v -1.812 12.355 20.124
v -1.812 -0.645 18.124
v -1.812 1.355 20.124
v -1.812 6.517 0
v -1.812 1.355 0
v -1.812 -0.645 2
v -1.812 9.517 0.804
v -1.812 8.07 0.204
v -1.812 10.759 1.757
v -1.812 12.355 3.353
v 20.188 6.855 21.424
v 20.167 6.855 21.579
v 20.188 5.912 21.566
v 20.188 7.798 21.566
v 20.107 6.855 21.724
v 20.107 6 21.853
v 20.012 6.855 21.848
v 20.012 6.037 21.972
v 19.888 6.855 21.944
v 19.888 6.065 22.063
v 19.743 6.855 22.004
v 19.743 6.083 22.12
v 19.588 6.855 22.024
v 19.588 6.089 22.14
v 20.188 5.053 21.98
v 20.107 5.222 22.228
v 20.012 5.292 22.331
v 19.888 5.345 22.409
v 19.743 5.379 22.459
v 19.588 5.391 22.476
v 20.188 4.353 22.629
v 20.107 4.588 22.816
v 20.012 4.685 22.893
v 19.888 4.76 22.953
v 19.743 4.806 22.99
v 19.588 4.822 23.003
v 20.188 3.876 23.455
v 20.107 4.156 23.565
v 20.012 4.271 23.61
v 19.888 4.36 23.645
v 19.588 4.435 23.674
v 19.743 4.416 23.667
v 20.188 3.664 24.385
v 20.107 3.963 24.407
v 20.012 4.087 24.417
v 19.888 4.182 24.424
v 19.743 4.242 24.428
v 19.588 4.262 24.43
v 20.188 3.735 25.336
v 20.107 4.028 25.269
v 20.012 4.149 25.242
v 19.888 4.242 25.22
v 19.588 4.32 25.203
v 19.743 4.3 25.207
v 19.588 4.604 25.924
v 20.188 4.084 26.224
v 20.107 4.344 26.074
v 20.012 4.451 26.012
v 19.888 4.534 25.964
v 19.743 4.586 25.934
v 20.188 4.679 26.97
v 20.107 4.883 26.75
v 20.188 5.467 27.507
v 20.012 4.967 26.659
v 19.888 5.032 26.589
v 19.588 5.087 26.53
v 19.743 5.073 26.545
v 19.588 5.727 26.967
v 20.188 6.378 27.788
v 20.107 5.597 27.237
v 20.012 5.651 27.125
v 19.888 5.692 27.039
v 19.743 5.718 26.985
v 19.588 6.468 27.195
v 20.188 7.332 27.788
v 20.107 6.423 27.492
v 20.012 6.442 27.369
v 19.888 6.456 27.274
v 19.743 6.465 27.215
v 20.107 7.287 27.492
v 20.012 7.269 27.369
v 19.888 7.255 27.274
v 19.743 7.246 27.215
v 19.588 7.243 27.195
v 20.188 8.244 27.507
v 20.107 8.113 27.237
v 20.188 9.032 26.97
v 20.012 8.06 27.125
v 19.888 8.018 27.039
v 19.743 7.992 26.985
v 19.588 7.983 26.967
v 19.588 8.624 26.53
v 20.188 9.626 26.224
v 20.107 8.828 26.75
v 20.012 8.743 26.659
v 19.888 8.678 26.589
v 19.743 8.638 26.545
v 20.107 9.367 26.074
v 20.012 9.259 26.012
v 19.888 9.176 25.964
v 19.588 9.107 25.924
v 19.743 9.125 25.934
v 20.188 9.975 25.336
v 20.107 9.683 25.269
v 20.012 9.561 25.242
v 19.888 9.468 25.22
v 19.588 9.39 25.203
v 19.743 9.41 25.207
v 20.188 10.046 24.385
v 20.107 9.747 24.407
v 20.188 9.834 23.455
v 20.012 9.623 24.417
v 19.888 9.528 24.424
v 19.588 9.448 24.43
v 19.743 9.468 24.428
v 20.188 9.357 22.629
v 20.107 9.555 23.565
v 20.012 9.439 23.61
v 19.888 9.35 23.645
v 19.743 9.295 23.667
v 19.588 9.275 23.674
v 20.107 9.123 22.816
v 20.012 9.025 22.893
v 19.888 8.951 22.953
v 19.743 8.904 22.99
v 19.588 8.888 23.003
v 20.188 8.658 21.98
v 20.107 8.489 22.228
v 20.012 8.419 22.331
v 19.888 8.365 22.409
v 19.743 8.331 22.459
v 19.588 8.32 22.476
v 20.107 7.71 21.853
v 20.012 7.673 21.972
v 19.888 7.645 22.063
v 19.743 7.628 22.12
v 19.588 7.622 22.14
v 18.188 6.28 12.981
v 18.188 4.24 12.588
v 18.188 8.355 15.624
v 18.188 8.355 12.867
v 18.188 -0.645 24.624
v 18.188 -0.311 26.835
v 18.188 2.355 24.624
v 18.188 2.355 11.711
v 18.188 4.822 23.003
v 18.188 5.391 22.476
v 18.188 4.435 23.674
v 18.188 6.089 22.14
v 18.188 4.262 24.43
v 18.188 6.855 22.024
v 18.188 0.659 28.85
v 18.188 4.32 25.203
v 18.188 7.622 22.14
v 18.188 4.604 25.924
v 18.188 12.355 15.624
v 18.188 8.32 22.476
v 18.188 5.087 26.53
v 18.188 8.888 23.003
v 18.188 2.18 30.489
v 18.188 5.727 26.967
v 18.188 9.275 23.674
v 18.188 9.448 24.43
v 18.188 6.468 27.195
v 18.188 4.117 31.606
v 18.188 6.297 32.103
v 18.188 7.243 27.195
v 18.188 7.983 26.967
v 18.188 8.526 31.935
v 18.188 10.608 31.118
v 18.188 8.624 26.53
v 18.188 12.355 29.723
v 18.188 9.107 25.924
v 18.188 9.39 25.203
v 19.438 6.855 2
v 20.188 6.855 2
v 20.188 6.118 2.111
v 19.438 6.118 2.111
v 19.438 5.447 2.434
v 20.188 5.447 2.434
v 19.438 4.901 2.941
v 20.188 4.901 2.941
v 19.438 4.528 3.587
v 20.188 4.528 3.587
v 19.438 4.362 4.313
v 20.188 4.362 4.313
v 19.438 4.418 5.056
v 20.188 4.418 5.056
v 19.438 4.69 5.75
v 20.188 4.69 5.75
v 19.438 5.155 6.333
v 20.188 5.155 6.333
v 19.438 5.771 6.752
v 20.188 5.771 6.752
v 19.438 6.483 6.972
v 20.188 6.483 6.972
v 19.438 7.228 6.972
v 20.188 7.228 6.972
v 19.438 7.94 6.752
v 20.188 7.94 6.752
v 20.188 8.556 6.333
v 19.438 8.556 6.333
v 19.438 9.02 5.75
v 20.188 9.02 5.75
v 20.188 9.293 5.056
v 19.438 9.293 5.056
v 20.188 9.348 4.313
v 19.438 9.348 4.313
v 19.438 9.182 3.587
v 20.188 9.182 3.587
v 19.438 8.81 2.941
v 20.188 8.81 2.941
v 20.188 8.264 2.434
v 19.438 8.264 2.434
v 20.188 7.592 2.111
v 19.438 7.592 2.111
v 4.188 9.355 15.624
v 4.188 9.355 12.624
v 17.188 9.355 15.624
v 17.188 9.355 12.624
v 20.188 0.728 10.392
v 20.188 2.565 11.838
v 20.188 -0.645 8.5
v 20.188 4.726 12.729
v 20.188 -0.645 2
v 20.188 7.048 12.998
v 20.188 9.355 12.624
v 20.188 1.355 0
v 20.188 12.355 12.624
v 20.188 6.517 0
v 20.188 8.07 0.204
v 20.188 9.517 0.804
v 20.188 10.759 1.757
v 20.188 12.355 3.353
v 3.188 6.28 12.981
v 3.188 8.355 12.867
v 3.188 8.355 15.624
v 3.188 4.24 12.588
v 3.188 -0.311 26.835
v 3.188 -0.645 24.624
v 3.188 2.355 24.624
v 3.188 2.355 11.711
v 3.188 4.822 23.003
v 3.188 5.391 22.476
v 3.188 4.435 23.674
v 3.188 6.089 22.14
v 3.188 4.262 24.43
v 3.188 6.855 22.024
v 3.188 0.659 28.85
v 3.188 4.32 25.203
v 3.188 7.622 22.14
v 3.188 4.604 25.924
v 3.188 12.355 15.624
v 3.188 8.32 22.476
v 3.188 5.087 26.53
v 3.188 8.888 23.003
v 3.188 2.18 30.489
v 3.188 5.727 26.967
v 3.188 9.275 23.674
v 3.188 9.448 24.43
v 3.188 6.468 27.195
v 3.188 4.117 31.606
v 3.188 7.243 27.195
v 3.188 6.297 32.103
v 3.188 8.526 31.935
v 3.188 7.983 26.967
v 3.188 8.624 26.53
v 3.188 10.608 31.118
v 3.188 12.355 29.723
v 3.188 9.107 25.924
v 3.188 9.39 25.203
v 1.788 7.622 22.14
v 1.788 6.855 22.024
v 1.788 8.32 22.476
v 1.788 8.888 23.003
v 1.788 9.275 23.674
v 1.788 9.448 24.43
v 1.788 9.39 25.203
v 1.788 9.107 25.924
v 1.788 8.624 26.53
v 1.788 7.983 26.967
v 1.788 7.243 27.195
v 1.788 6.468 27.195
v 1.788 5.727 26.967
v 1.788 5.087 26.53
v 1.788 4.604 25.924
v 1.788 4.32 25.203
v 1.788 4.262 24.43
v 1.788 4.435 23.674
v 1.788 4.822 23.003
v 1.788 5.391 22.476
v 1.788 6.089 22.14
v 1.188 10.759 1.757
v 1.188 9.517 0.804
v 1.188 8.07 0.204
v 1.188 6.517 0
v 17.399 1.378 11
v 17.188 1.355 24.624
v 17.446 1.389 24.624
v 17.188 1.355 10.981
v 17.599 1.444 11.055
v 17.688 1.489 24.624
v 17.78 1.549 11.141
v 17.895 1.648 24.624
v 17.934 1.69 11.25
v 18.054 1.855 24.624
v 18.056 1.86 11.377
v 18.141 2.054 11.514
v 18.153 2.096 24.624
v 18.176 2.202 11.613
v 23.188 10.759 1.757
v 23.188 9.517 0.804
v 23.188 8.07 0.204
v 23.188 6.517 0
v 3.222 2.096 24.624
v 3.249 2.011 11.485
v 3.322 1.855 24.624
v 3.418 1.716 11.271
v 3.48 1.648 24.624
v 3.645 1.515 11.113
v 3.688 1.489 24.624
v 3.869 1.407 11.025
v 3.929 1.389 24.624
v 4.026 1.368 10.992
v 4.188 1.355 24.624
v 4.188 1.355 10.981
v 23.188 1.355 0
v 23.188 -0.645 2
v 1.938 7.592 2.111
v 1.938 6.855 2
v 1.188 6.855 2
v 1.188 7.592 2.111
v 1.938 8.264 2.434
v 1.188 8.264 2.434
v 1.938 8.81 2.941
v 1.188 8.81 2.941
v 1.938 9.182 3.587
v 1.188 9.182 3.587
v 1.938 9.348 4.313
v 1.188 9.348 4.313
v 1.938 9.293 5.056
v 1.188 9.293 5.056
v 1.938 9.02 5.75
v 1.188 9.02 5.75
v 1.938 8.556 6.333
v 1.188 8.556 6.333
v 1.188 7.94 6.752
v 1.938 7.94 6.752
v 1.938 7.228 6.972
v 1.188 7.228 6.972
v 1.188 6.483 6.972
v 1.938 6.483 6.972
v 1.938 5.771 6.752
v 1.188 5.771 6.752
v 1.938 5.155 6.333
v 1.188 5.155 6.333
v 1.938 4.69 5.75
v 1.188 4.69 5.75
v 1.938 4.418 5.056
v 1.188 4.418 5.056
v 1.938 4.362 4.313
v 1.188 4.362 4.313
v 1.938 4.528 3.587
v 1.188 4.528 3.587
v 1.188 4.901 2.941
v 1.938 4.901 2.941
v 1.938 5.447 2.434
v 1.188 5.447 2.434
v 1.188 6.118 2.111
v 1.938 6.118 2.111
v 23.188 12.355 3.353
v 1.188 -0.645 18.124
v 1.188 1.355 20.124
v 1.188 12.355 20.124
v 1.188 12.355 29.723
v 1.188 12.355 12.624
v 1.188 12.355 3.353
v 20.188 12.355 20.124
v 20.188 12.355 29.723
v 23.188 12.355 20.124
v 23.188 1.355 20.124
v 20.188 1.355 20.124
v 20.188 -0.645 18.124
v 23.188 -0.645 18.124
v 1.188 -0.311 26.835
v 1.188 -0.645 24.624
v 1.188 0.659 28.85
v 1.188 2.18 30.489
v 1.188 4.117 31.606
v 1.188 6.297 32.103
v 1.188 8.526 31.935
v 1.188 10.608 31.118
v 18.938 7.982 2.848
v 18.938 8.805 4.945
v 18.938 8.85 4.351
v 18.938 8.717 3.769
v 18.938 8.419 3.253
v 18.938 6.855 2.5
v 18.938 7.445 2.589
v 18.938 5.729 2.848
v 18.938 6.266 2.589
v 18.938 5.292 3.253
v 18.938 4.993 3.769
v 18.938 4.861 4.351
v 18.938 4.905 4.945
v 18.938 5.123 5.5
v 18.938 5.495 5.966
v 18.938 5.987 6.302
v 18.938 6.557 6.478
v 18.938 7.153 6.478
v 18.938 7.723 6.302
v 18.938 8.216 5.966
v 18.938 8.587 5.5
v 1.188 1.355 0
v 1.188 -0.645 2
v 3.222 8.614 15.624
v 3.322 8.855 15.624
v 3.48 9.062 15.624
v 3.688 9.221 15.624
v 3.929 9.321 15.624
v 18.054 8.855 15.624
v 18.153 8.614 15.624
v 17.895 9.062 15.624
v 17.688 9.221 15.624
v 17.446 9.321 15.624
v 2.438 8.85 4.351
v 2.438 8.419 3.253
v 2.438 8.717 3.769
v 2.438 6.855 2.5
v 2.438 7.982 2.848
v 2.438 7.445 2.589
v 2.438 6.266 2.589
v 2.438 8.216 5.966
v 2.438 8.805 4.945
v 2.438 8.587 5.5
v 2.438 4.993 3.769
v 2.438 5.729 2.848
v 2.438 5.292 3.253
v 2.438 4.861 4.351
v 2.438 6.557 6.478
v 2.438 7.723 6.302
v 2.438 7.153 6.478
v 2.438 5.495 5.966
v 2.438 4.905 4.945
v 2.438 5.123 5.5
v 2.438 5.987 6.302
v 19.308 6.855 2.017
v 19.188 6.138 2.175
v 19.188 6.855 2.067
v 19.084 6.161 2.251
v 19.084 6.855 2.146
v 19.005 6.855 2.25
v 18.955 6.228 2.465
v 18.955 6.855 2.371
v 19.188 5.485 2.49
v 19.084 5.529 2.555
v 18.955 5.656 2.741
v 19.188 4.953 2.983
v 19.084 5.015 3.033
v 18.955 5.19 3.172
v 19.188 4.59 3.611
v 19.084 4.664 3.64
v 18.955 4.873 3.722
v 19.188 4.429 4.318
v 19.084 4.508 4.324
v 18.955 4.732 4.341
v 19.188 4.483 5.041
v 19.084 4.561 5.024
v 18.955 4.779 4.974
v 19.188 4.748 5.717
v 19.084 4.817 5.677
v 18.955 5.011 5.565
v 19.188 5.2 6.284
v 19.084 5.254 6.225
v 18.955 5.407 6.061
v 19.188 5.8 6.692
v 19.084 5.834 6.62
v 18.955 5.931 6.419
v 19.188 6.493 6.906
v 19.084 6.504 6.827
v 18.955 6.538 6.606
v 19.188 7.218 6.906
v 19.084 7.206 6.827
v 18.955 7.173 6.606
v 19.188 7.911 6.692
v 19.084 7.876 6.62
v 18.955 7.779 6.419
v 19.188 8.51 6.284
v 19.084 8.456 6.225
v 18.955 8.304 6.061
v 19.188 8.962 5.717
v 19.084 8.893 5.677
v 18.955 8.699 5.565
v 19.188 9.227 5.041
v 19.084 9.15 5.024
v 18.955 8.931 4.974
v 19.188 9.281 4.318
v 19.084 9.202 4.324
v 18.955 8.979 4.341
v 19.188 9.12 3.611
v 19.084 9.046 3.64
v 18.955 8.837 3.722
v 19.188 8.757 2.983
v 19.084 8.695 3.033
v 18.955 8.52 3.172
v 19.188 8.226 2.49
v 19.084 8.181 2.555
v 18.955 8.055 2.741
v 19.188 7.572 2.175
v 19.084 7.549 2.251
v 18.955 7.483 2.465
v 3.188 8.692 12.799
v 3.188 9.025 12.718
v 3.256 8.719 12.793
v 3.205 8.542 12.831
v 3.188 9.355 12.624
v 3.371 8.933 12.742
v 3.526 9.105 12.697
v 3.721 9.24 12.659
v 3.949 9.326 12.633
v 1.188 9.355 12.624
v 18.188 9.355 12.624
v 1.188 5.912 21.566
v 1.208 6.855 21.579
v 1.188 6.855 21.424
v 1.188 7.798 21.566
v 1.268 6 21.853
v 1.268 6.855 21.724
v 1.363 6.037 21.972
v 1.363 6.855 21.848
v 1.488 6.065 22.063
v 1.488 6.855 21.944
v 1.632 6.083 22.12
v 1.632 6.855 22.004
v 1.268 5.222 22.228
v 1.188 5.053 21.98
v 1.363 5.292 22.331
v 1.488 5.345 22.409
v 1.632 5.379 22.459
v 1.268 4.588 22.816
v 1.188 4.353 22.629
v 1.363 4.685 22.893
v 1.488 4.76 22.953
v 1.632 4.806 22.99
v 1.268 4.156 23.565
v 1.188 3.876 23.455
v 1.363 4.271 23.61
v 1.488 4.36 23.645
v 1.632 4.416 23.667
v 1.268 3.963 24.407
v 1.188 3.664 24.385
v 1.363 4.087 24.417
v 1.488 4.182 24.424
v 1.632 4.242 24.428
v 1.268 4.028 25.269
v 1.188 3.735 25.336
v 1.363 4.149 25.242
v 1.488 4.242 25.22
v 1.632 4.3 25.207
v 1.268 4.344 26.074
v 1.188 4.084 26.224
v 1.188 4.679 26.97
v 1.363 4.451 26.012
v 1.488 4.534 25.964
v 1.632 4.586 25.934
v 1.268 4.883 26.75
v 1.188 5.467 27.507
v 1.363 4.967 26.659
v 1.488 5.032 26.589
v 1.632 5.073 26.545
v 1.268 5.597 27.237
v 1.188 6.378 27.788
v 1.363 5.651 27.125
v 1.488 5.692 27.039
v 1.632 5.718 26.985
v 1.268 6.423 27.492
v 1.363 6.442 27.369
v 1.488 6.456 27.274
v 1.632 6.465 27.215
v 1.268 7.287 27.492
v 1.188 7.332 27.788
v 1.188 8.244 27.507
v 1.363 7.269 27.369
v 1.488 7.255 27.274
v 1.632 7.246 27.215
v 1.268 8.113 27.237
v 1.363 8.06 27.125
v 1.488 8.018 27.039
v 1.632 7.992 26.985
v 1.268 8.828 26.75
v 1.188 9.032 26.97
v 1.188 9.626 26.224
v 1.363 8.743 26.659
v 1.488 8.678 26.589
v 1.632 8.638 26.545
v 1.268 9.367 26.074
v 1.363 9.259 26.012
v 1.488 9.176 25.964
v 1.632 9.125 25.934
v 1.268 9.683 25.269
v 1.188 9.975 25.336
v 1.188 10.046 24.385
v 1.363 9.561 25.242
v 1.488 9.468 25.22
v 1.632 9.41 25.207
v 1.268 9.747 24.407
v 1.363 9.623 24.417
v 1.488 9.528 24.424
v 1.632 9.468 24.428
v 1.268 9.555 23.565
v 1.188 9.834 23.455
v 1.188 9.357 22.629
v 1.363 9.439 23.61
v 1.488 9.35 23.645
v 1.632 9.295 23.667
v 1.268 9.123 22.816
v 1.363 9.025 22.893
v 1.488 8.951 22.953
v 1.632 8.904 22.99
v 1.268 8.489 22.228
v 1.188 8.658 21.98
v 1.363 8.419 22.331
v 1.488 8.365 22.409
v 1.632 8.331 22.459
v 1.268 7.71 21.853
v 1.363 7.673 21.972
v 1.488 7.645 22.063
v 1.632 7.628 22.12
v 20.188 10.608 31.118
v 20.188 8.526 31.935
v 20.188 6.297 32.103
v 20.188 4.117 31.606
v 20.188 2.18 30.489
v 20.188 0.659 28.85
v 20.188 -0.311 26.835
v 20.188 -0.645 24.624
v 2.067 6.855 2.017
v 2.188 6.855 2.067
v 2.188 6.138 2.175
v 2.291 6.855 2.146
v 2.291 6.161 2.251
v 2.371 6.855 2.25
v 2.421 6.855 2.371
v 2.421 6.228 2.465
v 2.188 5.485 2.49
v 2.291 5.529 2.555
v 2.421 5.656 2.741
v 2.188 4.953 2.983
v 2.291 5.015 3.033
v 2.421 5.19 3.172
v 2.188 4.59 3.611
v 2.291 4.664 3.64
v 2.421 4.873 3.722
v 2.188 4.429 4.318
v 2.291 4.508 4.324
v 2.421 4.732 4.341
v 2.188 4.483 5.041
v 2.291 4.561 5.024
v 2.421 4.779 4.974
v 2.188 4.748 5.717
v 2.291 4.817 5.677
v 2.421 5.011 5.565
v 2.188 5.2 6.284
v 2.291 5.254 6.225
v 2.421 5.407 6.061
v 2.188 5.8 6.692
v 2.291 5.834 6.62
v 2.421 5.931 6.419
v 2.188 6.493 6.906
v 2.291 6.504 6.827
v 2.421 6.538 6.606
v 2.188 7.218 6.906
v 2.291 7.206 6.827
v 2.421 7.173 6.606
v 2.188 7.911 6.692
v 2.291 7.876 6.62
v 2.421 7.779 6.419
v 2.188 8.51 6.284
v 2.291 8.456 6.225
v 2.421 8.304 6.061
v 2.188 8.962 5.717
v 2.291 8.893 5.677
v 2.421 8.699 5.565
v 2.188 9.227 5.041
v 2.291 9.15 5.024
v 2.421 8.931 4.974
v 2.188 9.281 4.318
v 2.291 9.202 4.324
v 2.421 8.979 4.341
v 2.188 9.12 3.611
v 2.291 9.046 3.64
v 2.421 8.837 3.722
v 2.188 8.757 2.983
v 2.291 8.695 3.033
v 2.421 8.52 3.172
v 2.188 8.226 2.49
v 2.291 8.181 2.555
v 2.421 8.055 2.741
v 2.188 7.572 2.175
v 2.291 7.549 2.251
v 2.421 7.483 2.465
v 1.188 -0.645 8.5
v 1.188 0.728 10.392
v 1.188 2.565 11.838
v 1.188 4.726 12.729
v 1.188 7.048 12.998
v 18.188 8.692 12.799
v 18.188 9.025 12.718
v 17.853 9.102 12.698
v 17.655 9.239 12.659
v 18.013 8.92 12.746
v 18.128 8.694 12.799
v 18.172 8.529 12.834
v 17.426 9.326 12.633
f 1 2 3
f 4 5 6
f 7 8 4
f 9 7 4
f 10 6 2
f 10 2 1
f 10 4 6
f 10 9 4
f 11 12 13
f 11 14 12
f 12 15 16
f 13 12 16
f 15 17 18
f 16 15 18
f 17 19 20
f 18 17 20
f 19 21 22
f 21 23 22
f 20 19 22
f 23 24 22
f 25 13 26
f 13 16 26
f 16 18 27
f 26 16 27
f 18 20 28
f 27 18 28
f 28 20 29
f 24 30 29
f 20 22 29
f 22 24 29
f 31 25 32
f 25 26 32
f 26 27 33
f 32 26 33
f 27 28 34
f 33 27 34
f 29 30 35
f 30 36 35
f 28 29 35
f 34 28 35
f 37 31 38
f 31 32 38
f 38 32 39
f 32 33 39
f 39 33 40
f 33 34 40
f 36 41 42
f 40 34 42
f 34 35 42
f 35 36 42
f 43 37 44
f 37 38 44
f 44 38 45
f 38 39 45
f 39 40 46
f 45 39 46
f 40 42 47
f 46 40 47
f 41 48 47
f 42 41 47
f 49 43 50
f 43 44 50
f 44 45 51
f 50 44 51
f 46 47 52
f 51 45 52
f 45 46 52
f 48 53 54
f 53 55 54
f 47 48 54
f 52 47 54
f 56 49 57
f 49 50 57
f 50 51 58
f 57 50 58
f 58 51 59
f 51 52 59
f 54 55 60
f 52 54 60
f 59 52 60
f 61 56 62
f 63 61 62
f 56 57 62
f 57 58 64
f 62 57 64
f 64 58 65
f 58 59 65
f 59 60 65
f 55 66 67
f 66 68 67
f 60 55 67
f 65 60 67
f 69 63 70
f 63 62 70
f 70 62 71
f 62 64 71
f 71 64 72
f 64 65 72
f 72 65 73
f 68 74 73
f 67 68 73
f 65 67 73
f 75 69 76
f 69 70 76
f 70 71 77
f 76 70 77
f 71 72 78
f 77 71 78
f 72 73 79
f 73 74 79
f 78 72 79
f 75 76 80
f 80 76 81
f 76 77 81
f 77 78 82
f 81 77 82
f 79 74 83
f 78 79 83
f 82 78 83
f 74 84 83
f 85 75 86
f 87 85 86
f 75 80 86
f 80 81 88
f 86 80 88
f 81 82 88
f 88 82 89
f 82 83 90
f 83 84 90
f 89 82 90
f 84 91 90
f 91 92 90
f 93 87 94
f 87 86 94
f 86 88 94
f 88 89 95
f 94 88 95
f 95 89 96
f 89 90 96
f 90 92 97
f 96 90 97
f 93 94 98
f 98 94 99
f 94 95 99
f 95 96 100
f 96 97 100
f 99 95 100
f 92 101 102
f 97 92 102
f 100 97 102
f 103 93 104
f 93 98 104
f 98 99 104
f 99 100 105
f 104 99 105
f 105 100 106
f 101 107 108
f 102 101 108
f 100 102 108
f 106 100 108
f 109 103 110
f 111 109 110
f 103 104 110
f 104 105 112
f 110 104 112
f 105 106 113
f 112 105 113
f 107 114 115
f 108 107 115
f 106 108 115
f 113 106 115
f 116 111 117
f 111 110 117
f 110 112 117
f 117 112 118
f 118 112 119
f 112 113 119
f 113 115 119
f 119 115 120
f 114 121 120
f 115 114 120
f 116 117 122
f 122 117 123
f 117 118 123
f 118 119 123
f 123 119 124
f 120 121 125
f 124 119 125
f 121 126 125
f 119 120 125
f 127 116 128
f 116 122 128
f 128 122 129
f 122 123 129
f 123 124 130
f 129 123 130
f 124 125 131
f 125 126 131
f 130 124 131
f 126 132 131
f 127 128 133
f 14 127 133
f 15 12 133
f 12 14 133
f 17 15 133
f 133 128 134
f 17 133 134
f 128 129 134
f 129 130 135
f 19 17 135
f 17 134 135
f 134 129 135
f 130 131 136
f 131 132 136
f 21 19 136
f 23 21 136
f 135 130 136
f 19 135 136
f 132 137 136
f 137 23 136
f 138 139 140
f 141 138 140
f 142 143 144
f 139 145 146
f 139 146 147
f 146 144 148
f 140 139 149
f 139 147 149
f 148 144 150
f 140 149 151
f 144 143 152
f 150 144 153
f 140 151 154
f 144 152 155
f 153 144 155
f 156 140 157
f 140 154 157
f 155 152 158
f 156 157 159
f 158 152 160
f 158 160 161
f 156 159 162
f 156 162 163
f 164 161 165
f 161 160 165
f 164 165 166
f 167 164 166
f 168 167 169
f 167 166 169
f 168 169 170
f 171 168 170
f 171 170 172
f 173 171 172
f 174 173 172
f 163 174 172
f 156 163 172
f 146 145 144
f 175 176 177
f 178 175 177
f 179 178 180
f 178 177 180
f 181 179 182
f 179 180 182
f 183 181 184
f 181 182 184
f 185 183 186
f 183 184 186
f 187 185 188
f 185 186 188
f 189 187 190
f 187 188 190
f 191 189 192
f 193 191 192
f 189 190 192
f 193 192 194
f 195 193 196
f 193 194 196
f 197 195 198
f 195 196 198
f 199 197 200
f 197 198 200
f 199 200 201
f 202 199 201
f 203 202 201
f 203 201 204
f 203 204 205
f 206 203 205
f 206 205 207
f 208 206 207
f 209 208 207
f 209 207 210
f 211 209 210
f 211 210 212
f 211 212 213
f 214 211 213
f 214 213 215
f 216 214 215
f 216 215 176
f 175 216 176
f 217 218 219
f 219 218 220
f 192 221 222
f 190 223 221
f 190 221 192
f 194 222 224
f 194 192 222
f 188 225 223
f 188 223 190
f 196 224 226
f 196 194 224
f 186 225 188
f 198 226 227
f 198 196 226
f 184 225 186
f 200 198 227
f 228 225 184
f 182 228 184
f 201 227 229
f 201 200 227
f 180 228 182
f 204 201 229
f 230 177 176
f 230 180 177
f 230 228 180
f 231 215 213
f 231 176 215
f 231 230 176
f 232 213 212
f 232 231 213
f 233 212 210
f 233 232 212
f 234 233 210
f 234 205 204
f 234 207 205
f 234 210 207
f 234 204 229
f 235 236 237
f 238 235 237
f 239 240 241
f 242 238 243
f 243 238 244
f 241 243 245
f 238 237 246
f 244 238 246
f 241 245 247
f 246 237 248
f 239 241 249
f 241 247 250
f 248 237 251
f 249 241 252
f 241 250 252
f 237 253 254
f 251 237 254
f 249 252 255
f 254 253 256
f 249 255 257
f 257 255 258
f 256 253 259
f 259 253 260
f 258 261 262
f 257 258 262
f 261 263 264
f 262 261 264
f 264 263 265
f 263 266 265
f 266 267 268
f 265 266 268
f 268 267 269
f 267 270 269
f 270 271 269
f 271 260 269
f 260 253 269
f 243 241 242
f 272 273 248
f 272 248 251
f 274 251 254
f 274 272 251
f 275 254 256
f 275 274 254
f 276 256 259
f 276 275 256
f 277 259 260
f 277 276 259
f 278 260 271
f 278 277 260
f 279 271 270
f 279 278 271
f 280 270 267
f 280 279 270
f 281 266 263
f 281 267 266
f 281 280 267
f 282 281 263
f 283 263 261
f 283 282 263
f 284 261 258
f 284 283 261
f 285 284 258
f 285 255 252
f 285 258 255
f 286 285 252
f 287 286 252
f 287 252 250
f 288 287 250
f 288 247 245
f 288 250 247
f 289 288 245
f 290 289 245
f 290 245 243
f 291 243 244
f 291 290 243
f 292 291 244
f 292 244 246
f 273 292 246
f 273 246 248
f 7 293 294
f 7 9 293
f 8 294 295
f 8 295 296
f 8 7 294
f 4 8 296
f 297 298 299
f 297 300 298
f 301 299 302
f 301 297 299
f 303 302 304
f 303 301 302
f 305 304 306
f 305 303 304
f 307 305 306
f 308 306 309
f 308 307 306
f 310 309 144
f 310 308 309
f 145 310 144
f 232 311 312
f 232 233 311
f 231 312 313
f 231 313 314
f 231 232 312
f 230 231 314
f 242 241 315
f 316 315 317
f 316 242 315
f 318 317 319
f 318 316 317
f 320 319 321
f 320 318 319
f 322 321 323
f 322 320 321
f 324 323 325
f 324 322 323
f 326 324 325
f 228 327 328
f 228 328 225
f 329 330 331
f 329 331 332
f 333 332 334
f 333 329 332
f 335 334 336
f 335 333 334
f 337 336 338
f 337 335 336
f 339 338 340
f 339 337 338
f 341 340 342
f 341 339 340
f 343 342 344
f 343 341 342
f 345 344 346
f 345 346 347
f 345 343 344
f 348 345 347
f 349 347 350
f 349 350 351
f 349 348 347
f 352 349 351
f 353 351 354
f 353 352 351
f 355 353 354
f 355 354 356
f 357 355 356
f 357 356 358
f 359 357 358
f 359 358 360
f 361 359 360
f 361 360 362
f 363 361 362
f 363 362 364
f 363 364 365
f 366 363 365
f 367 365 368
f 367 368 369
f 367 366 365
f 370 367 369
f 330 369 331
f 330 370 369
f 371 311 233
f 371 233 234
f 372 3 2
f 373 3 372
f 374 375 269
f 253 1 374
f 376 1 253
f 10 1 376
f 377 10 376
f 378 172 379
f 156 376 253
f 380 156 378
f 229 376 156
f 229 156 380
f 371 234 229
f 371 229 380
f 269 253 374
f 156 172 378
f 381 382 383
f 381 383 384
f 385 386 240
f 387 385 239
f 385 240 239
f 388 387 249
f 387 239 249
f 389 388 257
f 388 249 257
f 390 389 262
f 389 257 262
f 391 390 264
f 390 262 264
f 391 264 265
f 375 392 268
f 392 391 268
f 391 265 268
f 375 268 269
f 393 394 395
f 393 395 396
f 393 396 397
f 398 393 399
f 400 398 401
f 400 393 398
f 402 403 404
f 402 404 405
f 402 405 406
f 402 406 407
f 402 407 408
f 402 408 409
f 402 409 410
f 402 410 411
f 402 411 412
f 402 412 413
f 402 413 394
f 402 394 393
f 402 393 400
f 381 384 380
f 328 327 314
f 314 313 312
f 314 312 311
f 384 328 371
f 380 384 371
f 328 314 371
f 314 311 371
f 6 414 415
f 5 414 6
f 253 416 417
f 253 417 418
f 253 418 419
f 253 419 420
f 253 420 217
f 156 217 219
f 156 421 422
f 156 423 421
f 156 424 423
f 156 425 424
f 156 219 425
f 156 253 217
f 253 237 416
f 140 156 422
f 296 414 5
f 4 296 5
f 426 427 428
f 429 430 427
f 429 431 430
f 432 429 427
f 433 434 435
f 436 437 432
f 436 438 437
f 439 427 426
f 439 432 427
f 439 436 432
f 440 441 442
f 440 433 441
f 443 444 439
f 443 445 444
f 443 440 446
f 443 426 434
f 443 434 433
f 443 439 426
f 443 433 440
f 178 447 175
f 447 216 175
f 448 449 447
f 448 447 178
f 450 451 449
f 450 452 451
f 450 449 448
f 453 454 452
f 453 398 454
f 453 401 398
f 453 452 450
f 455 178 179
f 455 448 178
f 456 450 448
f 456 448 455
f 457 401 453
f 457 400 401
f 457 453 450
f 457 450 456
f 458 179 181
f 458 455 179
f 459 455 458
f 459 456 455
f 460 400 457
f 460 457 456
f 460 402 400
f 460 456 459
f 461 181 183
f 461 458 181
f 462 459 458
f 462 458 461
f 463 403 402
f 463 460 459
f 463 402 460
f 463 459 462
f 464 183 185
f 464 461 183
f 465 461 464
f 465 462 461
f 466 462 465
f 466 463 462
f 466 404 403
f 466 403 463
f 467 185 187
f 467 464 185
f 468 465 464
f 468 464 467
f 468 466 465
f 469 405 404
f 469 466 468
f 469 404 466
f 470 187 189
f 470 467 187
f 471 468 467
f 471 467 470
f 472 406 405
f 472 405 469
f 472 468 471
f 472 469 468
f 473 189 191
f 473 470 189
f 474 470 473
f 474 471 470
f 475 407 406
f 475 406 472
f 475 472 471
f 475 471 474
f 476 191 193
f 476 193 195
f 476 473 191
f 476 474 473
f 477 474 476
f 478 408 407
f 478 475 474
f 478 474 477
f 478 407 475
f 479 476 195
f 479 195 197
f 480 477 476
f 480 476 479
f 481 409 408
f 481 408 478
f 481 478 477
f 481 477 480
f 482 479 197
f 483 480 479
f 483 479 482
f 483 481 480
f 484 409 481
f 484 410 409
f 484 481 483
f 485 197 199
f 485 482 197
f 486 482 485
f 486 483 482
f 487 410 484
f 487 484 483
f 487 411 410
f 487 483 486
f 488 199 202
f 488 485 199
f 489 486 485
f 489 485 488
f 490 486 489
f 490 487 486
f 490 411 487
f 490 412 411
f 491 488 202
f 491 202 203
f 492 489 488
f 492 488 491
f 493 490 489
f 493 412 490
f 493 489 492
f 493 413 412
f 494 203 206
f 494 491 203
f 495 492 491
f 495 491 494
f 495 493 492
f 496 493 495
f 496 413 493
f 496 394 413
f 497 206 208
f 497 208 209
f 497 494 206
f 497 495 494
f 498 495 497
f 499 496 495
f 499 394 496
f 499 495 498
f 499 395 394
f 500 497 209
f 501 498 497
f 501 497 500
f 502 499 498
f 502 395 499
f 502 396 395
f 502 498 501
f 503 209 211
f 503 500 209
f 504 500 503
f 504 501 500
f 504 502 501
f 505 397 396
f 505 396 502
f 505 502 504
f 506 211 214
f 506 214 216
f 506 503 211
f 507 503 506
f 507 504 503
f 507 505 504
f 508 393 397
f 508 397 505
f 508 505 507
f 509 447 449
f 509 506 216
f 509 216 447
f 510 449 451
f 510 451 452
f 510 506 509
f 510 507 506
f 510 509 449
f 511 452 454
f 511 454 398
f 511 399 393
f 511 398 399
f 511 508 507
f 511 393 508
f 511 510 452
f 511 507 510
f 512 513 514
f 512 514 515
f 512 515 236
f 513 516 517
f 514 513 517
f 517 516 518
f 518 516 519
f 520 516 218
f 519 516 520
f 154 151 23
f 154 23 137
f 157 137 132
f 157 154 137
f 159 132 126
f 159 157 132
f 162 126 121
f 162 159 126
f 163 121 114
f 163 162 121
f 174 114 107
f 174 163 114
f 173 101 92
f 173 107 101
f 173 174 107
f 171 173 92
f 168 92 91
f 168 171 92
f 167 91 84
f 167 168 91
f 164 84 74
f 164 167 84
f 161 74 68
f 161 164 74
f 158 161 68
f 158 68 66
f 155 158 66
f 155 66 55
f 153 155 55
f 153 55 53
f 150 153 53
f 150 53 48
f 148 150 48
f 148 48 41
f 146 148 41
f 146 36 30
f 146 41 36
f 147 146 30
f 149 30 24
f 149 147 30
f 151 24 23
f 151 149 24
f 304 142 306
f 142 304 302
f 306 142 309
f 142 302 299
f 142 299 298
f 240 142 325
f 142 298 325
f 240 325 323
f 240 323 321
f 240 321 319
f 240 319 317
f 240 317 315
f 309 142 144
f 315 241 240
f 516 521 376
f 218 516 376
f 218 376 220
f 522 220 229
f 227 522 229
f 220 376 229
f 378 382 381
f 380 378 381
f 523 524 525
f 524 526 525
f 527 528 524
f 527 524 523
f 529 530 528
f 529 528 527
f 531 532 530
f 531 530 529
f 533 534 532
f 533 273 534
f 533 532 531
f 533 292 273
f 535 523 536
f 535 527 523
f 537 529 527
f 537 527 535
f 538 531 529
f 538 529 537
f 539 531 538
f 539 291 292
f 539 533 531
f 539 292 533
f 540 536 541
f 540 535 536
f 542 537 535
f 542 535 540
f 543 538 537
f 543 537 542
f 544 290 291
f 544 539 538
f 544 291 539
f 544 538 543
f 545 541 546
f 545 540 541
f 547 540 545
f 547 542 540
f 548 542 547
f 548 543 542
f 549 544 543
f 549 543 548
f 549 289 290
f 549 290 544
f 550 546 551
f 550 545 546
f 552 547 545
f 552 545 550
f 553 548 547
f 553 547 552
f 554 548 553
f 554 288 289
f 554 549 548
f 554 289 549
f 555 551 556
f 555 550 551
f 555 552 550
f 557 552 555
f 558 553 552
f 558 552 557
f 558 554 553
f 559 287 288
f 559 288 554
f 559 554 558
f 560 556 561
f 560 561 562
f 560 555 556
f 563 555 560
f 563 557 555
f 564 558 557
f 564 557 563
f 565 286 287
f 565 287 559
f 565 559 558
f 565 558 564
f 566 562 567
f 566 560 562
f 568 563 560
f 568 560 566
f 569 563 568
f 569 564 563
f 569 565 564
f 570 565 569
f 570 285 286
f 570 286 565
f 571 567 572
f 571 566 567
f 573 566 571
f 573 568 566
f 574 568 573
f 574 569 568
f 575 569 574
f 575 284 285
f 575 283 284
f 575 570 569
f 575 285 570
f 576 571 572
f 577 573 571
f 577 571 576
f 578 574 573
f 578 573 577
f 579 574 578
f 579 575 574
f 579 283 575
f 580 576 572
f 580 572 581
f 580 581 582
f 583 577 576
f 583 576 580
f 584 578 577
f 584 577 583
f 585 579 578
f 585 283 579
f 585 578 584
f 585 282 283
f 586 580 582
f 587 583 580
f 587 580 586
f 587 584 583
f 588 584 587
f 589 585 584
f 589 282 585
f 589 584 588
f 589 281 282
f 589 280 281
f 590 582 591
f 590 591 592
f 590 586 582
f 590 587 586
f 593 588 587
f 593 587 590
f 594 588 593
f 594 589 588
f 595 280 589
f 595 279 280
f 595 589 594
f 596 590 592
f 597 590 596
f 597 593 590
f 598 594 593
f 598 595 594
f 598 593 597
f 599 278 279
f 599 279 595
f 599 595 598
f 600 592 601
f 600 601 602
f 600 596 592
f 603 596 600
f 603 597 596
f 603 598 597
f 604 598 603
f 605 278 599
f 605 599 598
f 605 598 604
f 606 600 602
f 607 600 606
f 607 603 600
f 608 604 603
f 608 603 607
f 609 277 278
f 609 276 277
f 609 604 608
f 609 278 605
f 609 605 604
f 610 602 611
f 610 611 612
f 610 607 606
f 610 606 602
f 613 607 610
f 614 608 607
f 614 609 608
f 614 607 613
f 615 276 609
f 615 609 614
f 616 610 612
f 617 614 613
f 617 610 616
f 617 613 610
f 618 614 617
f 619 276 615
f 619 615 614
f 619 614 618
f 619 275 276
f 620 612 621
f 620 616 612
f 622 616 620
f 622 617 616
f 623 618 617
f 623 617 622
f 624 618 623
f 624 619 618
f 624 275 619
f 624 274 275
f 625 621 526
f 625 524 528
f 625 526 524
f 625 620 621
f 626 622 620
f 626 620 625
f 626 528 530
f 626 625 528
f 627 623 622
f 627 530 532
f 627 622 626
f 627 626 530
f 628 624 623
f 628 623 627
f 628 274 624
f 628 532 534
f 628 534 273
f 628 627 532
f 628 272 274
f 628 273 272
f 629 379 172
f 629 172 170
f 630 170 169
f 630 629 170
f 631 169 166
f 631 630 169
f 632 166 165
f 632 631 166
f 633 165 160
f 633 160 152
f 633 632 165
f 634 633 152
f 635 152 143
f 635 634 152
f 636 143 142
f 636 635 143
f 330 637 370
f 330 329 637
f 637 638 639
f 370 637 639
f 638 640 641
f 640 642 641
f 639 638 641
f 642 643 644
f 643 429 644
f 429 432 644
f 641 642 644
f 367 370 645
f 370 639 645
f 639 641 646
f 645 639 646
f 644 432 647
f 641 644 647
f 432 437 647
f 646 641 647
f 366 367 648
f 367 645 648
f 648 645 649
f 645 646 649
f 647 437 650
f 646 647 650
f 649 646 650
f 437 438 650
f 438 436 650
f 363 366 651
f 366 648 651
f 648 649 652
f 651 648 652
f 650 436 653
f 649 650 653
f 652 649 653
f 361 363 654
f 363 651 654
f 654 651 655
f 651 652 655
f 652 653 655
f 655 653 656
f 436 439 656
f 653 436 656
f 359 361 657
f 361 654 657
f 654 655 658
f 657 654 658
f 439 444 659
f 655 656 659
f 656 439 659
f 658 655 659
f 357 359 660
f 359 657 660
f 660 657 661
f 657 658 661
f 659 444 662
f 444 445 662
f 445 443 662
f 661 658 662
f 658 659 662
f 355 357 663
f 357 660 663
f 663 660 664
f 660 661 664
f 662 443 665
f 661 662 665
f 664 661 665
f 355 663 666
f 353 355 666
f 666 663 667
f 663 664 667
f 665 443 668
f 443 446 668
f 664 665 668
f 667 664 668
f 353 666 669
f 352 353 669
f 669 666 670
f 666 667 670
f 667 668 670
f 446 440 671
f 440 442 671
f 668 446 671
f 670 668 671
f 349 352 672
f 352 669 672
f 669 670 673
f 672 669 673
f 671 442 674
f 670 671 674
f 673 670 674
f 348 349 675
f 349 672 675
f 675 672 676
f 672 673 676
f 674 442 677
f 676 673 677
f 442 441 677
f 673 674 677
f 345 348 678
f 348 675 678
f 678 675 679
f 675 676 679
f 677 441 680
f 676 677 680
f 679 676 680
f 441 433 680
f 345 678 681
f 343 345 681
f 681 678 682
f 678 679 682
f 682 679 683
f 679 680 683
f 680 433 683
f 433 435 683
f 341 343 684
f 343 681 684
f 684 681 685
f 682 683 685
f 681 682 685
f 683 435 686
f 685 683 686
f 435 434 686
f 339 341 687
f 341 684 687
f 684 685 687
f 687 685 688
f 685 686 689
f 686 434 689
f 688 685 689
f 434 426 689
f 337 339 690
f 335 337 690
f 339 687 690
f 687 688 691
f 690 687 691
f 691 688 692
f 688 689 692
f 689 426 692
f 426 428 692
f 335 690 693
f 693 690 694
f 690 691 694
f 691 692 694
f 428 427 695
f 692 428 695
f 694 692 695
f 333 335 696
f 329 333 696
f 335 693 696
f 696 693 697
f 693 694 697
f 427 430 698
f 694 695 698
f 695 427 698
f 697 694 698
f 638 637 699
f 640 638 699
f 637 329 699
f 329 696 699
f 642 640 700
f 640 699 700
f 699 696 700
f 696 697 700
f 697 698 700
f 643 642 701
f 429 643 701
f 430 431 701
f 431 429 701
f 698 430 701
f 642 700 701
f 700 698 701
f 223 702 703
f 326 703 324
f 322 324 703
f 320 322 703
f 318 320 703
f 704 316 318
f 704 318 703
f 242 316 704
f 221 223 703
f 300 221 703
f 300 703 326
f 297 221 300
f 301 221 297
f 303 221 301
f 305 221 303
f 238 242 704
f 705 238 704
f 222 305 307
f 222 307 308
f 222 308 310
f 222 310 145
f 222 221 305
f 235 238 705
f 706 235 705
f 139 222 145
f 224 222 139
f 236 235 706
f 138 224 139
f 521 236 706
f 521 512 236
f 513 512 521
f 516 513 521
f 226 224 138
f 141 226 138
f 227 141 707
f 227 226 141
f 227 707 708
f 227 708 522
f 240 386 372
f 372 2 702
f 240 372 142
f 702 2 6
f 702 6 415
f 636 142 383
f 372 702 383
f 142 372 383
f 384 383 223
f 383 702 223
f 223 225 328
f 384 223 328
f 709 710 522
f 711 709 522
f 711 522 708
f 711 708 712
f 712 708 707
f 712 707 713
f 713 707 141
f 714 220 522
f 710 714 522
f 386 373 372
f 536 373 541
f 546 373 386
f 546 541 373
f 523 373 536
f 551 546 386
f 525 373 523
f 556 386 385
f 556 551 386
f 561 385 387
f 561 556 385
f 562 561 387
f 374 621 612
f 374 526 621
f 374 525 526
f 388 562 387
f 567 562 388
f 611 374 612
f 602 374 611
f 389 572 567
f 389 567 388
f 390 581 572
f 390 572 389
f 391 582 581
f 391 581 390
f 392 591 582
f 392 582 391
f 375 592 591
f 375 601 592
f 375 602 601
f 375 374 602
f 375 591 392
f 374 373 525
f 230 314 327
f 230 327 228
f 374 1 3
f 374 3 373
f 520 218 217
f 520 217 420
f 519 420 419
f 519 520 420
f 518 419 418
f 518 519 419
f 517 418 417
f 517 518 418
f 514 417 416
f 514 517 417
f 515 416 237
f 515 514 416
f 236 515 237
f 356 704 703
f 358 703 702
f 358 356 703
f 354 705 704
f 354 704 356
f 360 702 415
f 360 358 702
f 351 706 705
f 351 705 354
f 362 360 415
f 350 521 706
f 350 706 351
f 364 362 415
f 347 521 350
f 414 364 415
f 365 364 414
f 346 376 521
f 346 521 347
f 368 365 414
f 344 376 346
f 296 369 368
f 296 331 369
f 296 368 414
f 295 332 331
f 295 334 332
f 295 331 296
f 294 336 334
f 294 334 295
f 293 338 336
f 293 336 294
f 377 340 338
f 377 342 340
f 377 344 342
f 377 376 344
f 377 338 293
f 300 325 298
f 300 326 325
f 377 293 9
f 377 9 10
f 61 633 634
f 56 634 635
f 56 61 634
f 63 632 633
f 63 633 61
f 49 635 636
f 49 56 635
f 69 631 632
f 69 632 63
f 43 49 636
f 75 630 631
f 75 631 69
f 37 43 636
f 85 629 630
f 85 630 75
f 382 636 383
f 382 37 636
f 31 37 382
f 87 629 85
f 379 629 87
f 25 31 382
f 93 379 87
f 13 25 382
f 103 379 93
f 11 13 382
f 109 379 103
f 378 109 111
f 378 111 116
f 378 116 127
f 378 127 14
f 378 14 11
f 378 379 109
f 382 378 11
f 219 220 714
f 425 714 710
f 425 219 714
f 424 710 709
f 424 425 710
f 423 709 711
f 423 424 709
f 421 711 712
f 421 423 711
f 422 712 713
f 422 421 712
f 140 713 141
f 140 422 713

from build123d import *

# Parameters (mm, degrees)
EXTRUDE_1_DEPTH           = 27
CUT_EXTRUDE_1_DEPTH       = 27
SKETCH_3_R                = 2.5000000000000013
EXTRUDE_2_DEPTH           = 2
CUT_EXTRUDE_START         = -2
SKETCH_4_R                = 8.5
SKETCH_4_R_2              = 2.5000000000000018
CUT_EXTRUDE_2_DEPTH       = 2
SKETCH_5_R                = 8.5
CUT_EXTRUDE_3_DEPTH       = 17
SKETCH_9_W                = 19
SKETCH_9_H                = 0.7371254741666728
CUT_EXTRUDE_7_DEPTH       = 4
CUT_EXTRUDE_8_DEPTH       = 0.906172
EXTRUDE_START             = 2
SKETCH_13_R               = 2.5000000000000004
EXTRUDE_4_DEPTH           = 2
SKETCH_14_W               = 3
SKETCH_14_H               = 7.375961595364039
SKETCH_14_W_2             = 2.9999999999999964
CUT_EXTRUDE_10_DEPTH      = 30
CUT_EXTRUDE_11_DEPTH      = 37.95471984311929
CUT_EXTRUDE_11_DEPTH_BACK = 37.95471984311929
FILLET_3_R                = 6
SKETCH_19_W               = 2.3759615953640427
SKETCH_19_H               = 13
CUT_EXTRUDE_13_DEPTH      = 37.95471984311929
SKETCH_18_R               = 7.499999999999999
EXTRUDE_5_DEPTH           = 2
EXTRUDE_START_2           = -2
SKETCH_20_R               = 7.499999999999999
EXTRUDE_6_DEPTH           = 2
SKETCH_21_W               = 27.916060476025446
SKETCH_21_H               = 6.853449812850004
CUT_EXTRUDE_14_DEPTH      = 44.16278511667507
CUT_EXTRUDE_15_DEPTH      = 41.84856377041868
CUT_EXTRUDE_15_DEPTH_BACK = 41.84856377041868
SKETCH_22_R               = 2.5999999999999996
FILLET_4_R                = 0.6
FILLET_5_R                = 0.6
FILLET_6_R                = 1
FILLET_7_R                = 0.5
SKETCH_23_R               = 2.5000000000000004
CUT_EXTRUDE_16_DEPTH      = 0.75
CUT_EXTRUDE_START_2       = -0.75
SKETCH_25_R               = 2.5000000000000013
CUT_EXTRUDE_17_DEPTH      = 0.75
FILLET_8_R                = 0.5
SKETCH_27_W               = 15
SKETCH_27_H               = 4.175939890720404
CUT_EXTRUDE_18_DEPTH      = 4
EXTRUDE_8_DEPTH           = 5
FILLET_9_R                = 1
SKETCH_29_W               = 2.9999999999999964
SKETCH_29_H               = 12.999999999999996
SKETCH_29_W_2             = 3
EXTRUDE_9_DEPTH           = 0.5
CHAMFER_1_SIZE            = 2


with BuildPart() as part:
    # 草圖1 → 填料-伸長1 (new body)
    with BuildSketch(Plane.XY):
        Polygon((-1.8124414345344562, 12.355214230576285), (23.187558565465547, 12.355214230576285), (23.187558565465547, -0.6447857694237141), (-1.8124414345344548, -0.6447857694237142), align=None)
        Polygon((3.1875585654655443, 9.355214230576284), (18.187558565465544, 9.355214230576284), (18.187558565465544, 1.355214230576286), (3.187558565465545, 1.355214230576286), align=None, mode=Mode.SUBTRACT)
    extrude(amount=EXTRUDE_1_DEPTH)

    # 草圖2 → 除料-伸長1 (cut)
    with BuildSketch(Plane(origin=(0, 12.355214230576285, 0), x_dir=(1, 0, 0), z_dir=(0, 1, 0))):
        Polygon((1.1875585654655443, 0), (20.187558565465547, 0), (20.187558565465547, -8), (1.1875585654655452, -8), align=None)
    extrude(amount=-CUT_EXTRUDE_1_DEPTH, mode=Mode.SUBTRACT)

    # 草圖3 → 填料-伸長2 (add)
    with BuildSketch(Plane.ZY.offset(-20.187558565465547)):
        with Locations(Location((4.5, 6.855214230576285, 0), (0, 0, 180))):
            Circle(SKETCH_3_R)
    extrude(amount=EXTRUDE_2_DEPTH)

    # 草圖4 → 除料-伸長2 (cut)
    with BuildSketch(Plane.ZY.offset(-18.187558565465547).offset(CUT_EXTRUDE_START)):
        with Locations((4.500000000000004, 6.855214230576285)):
            Circle(SKETCH_4_R)
        with Locations(Location((4.500000000000004, 6.855214230576285, 0), (0, 0, 180))):
            Circle(SKETCH_4_R_2, mode=Mode.SUBTRACT)
    extrude(amount=CUT_EXTRUDE_2_DEPTH, mode=Mode.SUBTRACT)

    # 草圖5 → 除料-伸長3 (cut)
    with BuildSketch(Plane.ZY.offset(-18.187558565465547)):
        with Locations((4.500000000000004, 6.855214230576285)):
            Circle(SKETCH_5_R)
    extrude(amount=CUT_EXTRUDE_3_DEPTH, mode=Mode.SUBTRACT)

    # 草圖9 → 除料-伸長7 (cut)
    with BuildSketch(Plane(origin=(0, 12.355214230576285, 0), x_dir=(1, 0, 0), z_dir=(0, 1, 0))):
        with Locations((10.687558565465551, -11.349303435491194)):
            Rectangle(SKETCH_9_W, SKETCH_9_H)
    extrude(amount=-CUT_EXTRUDE_7_DEPTH, mode=Mode.SUBTRACT)

    # 草圖10 → 除料-伸長8 (cut)
    with BuildSketch(Plane(origin=(0, 0, 11.717866172574531), x_dir=(-1, 0, 0), z_dir=(0, 0, -1))):
        Polygon((-20.18755856546555, 12.355214230576285), (-1.1875585654655494, 12.355214230576285), (-1.1875585654655487, 9.355214230576284), (-20.18755856546555, 9.355214230576284), align=None)
    extrude(amount=-CUT_EXTRUDE_8_DEPTH, mode=Mode.SUBTRACT)

    # 草圖13 → 填料-伸長4 (add)
    with BuildSketch(Plane(origin=(1.1875585654655443, 0, -1.3e-16), x_dir=(-1.1e-16, 0, -1), z_dir=(1, 0, -1.1e-16)).offset(EXTRUDE_START)):
        with Locations((-4.5, 6.855214230576285)):
            Circle(SKETCH_13_R)
    extrude(amount=-EXTRUDE_4_DEPTH)

    # 草圖14 → 除料-伸長10 (cut)
    with BuildSketch(Plane(origin=(0, 12.355214230576285, 0), x_dir=(1, 0, 0), z_dir=(0, 1, 0))):
        with Locations((-0.31244143453445605, -23.312019202317984)):
            Rectangle(SKETCH_14_W, SKETCH_14_H)
        with Locations((21.687558565465544, -23.312019202317984)):
            Rectangle(SKETCH_14_W_2, SKETCH_14_H)
        Polygon((3.1875585654655425, -27), (18.187558565465547, -27), (18.187558565465547, -19.624038404635964), (3.1875585654655443, -19.624038404635964), align=None)
    extrude(amount=-CUT_EXTRUDE_10_DEPTH, mode=Mode.SUBTRACT)

    # 草圖15 → 除料-伸長11 (cut, two sides: drawn at the far end of the back side and taken through both)
    with BuildSketch(Plane.ZY.offset(-20.187558565465547).offset(-CUT_EXTRUDE_11_DEPTH_BACK)):
        Polygon((0, 9.00201797372982), (3.3531962568464273, 12.355214230576285), (0, 12.355214230576285), align=None)
    extrude(amount=CUT_EXTRUDE_11_DEPTH + CUT_EXTRUDE_11_DEPTH_BACK, mode=Mode.SUBTRACT)

    # 圓角3
    fillet_3_edges = [part.edges().sort_by_distance(p)[0] for p in [
        (-0.31244143453445616, 9.00201797372982, 0),
        (21.687558565465547, 9.00201797372982, 0),
    ]]
    fillet(fillet_3_edges, radius=FILLET_3_R)

    # 草圖19 → 除料-伸長13 (cut, through all)
    with BuildSketch(Plane.ZY.offset(-1.187558565465544)):
        with Locations((25.812019202317984, 5.855214230576285)):
            Rectangle(SKETCH_19_W, SKETCH_19_H)
    extrude(amount=-CUT_EXTRUDE_13_DEPTH, mode=Mode.SUBTRACT)

    # 草圖18 → 填料-伸長5 (add)
    with BuildSketch(Plane(origin=(20.187558565465547, 0, 0), x_dir=(0, 0, -1), z_dir=(1, 0, 0))):
        with Locations((-24.624038404635964, 6.855214230576285)):
            Circle(SKETCH_18_R)
    extrude(amount=-EXTRUDE_5_DEPTH)

    # 草圖20 → 填料-伸長6 (add)
    with BuildSketch(Plane.ZY.offset(-1.187558565465544).offset(EXTRUDE_START_2)):
        with Locations((24.624038404635964, 6.855214230576285)):
            Circle(SKETCH_20_R)
    extrude(amount=EXTRUDE_6_DEPTH)

    # 草圖21 → 除料-伸長14 (cut, through all)
    with BuildSketch(Plane(origin=(23.187558565465547, 0, 0), x_dir=(0, 0, -1), z_dir=(1, 0, 0))):
        with Locations((-28.1917606773101, 15.781939137001288)):
            Rectangle(SKETCH_21_W, SKETCH_21_H)
    extrude(amount=-CUT_EXTRUDE_14_DEPTH, mode=Mode.SUBTRACT)

    # 草圖22 → 除料-伸長15 (cut, two sides: drawn at the far end of the back side and taken through both)
    with BuildSketch(Plane(origin=(20.187558565465547, 0, 0), x_dir=(0, 0, -1), z_dir=(1, 0, 0)).offset(-CUT_EXTRUDE_15_DEPTH_BACK)):
        with Locations((-24.624038404635964, 6.8552142305762835)):
            Circle(SKETCH_22_R)
    extrude(amount=CUT_EXTRUDE_15_DEPTH + CUT_EXTRUDE_15_DEPTH_BACK, mode=Mode.SUBTRACT)

    # 圓角4
    fillet_4_edges = [part.edges().sort_by_distance(p)[0] for p in [
        (20.187558565465547, 6.855214230576285, 27.224038404635962),
    ]]
    fillet(fillet_4_edges, radius=FILLET_4_R)

    # 圓角5
    fillet_5_edges = [part.edges().sort_by_distance(p)[0] for p in [
        (1.1875585654655438, 6.855214230576285, 27.224038404635962),
    ]]
    fillet(fillet_5_edges, radius=FILLET_5_R)

    # 圓角6
    # the kernel refuses this fillet: 1 mm, written as the material it adds along each edge
    with BuildSketch(Plane(origin=(18.187558565465544, 9.355214230576284, 19.624038404635964), x_dir=(3.55e-15, -1, 1.066e-14), z_dir=(5.1e-16, -1.066e-14, -1))) as fillet_6_piece_1_section:
        with BuildLine():
            CenterArc((FILLET_6_R, FILLET_6_R), FILLET_6_R, 180, 90.00000000000023)
            Line((-3.55e-15, FILLET_6_R), (0, 0))
            Line((0, 0), (FILLET_6_R, 0))
        make_face()
    fillet_6_piece_1 = extrude(amount=9.499999999999957, mode=Mode.PRIVATE)
    fillet_6_piece_1 = split(fillet_6_piece_1, bisect_by=Plane(origin=(17.960107802534193, 9.130564344096692, 12.624038172574531), z_dir=(0, 0, 1)), keep=Keep.TOP, mode=Mode.PRIVATE)
    fillet_6_piece_1 = fillet_6_piece_1 - Plane(origin=(17.96010780253419, 6.855214230576285, 4.5), x_dir=(2.4e-16, 0, 1), z_dir=(1, 0, -2.4e-16)) * Cylinder(8.5, 23, mode=Mode.PRIVATE)
    add(fillet_6_piece_1)
    with BuildSketch(Plane(origin=(3.187558565465544, 9.355214230576284, 10.124038404635964), x_dir=(0, -1, 0), z_dir=(0, 0, 1))) as fillet_6_piece_2_section:
        with BuildLine():
            CenterArc((FILLET_6_R, FILLET_6_R), FILLET_6_R, 180, 90)
            Line((0, FILLET_6_R), (0, 0))
            Line((0, 0), (FILLET_6_R, 0))
        make_face()
    fillet_6_piece_2 = extrude(amount=9.5, mode=Mode.PRIVATE)
    fillet_6_piece_2 = split(fillet_6_piece_2, bisect_by=Plane(origin=(3.4150094343401456, 9.130564406809754, 12.624038172574531), z_dir=(0, 0, 1)), keep=Keep.TOP, mode=Mode.PRIVATE)
    fillet_6_piece_2 = fillet_6_piece_2 - Plane(origin=(3.415009434340142, 6.855214230576285, 4.5000000000000036), x_dir=(2.4e-16, 0, 1), z_dir=(1, 0, -2.4e-16)) * Cylinder(8.5, 23, mode=Mode.PRIVATE)
    add(fillet_6_piece_2)

    # 圓角7
    fillet_7_edges = [part.edges().sort_by_distance(p)[0] for p in [
        (10.687558565465999, 9.355214230576284, 19.624038404635964),
        (3.4804517842794525, 9.062321011762547, 19.624038404636),
        (17.894665346652545, 9.062321011762547, 19.624038404636),
    ]]
    fillet(fillet_7_edges, radius=FILLET_7_R)

    # 草圖23 → 除料-伸長16 (cut)
    with BuildSketch(Plane(origin=(3.1875585654655443, 0, -3.5e-16), x_dir=(-1.1e-16, 0, -1), z_dir=(1, 0, -1.1e-16))):
        with Locations(Location((-4.5, 6.855214230576285, 0), (0, 0, 180))):
            Circle(SKETCH_23_R)
    extrude(amount=-CUT_EXTRUDE_16_DEPTH, mode=Mode.SUBTRACT)

    # 草圖25 → 除料-伸長17 (cut)
    with BuildSketch(Plane.ZY.offset(-18.187558565465547).offset(CUT_EXTRUDE_START_2)):
        with Locations(Location((4.500000000000004, 6.855214230576285, 0), (0, 0, 180))):
            Circle(SKETCH_25_R)
    extrude(amount=CUT_EXTRUDE_17_DEPTH, mode=Mode.SUBTRACT)

    # 圓角8
    fillet_8_edges = [part.edges().sort_by_distance(p)[0] for p in [
        (2.437558565465545, 6.855214230576286, 7),
        (18.937558565465547, 6.855214230576284, 7.000000000000001),
    ]]
    fillet(fillet_8_edges, radius=FILLET_8_R)

    # 草圖27 → 除料-伸長18 (cut)
    with BuildSketch(Plane.XY.offset(19.624038404635964)):
        with Locations((10.687558565465544, 10.267244285216083)):
            Rectangle(SKETCH_27_W, SKETCH_27_H)
    extrude(amount=-CUT_EXTRUDE_18_DEPTH, mode=Mode.SUBTRACT)

    # 草圖28 → 填料-伸長8 (add)
    with BuildSketch(Plane.XY.offset(19.624038404635964)):
        Polygon((18.187558565465547, -0.6447857694237141), (3.1875585654655443, -0.6447857694237141), (3.1875585654655434, 1.355214230576286), (18.187558565465547, 1.3552142305762875), align=None)
    extrude(amount=EXTRUDE_8_DEPTH)

    # 圓角9
    fillet_9_edges = [part.edges().sort_by_distance(p)[0] for p in [
        (18.187558565465544, 1.3552142305762809, 17.8023895515219),
        (3.1875585654655443, 1.355214230576286, 17.802389551521912),
    ]]
    fillet(fillet_9_edges, radius=FILLET_9_R)

    # 草圖29 → 填料-伸長9 (add)
    with BuildSketch(Plane.XY.offset(19.624038404635964)):
        with Locations((21.687558565465544, 5.8552142305762835)):
            Rectangle(SKETCH_29_W, SKETCH_29_H)
        with Locations((-0.31244143453445605, 5.8552142305762835)):
            Rectangle(SKETCH_29_W_2, SKETCH_29_H)
    extrude(amount=EXTRUDE_9_DEPTH)

    # 導角1
    chamfer_1_edges = [part.edges().sort_by_distance(p)[0] for p in [
        (21.687558565465547, -0.6447857694237141, 0),
        (21.687558565465547, -0.6447857694237141, 20.124038404635964),
        (-0.31244143453445616, -0.6447857694237141, 20.124038404635964),
        (-0.31244143453445616, -0.6447857694237142, 0),
    ]]
    chamfer(chamfer_1_edges, length=CHAMFER_1_SIZE)


solid = part.part
